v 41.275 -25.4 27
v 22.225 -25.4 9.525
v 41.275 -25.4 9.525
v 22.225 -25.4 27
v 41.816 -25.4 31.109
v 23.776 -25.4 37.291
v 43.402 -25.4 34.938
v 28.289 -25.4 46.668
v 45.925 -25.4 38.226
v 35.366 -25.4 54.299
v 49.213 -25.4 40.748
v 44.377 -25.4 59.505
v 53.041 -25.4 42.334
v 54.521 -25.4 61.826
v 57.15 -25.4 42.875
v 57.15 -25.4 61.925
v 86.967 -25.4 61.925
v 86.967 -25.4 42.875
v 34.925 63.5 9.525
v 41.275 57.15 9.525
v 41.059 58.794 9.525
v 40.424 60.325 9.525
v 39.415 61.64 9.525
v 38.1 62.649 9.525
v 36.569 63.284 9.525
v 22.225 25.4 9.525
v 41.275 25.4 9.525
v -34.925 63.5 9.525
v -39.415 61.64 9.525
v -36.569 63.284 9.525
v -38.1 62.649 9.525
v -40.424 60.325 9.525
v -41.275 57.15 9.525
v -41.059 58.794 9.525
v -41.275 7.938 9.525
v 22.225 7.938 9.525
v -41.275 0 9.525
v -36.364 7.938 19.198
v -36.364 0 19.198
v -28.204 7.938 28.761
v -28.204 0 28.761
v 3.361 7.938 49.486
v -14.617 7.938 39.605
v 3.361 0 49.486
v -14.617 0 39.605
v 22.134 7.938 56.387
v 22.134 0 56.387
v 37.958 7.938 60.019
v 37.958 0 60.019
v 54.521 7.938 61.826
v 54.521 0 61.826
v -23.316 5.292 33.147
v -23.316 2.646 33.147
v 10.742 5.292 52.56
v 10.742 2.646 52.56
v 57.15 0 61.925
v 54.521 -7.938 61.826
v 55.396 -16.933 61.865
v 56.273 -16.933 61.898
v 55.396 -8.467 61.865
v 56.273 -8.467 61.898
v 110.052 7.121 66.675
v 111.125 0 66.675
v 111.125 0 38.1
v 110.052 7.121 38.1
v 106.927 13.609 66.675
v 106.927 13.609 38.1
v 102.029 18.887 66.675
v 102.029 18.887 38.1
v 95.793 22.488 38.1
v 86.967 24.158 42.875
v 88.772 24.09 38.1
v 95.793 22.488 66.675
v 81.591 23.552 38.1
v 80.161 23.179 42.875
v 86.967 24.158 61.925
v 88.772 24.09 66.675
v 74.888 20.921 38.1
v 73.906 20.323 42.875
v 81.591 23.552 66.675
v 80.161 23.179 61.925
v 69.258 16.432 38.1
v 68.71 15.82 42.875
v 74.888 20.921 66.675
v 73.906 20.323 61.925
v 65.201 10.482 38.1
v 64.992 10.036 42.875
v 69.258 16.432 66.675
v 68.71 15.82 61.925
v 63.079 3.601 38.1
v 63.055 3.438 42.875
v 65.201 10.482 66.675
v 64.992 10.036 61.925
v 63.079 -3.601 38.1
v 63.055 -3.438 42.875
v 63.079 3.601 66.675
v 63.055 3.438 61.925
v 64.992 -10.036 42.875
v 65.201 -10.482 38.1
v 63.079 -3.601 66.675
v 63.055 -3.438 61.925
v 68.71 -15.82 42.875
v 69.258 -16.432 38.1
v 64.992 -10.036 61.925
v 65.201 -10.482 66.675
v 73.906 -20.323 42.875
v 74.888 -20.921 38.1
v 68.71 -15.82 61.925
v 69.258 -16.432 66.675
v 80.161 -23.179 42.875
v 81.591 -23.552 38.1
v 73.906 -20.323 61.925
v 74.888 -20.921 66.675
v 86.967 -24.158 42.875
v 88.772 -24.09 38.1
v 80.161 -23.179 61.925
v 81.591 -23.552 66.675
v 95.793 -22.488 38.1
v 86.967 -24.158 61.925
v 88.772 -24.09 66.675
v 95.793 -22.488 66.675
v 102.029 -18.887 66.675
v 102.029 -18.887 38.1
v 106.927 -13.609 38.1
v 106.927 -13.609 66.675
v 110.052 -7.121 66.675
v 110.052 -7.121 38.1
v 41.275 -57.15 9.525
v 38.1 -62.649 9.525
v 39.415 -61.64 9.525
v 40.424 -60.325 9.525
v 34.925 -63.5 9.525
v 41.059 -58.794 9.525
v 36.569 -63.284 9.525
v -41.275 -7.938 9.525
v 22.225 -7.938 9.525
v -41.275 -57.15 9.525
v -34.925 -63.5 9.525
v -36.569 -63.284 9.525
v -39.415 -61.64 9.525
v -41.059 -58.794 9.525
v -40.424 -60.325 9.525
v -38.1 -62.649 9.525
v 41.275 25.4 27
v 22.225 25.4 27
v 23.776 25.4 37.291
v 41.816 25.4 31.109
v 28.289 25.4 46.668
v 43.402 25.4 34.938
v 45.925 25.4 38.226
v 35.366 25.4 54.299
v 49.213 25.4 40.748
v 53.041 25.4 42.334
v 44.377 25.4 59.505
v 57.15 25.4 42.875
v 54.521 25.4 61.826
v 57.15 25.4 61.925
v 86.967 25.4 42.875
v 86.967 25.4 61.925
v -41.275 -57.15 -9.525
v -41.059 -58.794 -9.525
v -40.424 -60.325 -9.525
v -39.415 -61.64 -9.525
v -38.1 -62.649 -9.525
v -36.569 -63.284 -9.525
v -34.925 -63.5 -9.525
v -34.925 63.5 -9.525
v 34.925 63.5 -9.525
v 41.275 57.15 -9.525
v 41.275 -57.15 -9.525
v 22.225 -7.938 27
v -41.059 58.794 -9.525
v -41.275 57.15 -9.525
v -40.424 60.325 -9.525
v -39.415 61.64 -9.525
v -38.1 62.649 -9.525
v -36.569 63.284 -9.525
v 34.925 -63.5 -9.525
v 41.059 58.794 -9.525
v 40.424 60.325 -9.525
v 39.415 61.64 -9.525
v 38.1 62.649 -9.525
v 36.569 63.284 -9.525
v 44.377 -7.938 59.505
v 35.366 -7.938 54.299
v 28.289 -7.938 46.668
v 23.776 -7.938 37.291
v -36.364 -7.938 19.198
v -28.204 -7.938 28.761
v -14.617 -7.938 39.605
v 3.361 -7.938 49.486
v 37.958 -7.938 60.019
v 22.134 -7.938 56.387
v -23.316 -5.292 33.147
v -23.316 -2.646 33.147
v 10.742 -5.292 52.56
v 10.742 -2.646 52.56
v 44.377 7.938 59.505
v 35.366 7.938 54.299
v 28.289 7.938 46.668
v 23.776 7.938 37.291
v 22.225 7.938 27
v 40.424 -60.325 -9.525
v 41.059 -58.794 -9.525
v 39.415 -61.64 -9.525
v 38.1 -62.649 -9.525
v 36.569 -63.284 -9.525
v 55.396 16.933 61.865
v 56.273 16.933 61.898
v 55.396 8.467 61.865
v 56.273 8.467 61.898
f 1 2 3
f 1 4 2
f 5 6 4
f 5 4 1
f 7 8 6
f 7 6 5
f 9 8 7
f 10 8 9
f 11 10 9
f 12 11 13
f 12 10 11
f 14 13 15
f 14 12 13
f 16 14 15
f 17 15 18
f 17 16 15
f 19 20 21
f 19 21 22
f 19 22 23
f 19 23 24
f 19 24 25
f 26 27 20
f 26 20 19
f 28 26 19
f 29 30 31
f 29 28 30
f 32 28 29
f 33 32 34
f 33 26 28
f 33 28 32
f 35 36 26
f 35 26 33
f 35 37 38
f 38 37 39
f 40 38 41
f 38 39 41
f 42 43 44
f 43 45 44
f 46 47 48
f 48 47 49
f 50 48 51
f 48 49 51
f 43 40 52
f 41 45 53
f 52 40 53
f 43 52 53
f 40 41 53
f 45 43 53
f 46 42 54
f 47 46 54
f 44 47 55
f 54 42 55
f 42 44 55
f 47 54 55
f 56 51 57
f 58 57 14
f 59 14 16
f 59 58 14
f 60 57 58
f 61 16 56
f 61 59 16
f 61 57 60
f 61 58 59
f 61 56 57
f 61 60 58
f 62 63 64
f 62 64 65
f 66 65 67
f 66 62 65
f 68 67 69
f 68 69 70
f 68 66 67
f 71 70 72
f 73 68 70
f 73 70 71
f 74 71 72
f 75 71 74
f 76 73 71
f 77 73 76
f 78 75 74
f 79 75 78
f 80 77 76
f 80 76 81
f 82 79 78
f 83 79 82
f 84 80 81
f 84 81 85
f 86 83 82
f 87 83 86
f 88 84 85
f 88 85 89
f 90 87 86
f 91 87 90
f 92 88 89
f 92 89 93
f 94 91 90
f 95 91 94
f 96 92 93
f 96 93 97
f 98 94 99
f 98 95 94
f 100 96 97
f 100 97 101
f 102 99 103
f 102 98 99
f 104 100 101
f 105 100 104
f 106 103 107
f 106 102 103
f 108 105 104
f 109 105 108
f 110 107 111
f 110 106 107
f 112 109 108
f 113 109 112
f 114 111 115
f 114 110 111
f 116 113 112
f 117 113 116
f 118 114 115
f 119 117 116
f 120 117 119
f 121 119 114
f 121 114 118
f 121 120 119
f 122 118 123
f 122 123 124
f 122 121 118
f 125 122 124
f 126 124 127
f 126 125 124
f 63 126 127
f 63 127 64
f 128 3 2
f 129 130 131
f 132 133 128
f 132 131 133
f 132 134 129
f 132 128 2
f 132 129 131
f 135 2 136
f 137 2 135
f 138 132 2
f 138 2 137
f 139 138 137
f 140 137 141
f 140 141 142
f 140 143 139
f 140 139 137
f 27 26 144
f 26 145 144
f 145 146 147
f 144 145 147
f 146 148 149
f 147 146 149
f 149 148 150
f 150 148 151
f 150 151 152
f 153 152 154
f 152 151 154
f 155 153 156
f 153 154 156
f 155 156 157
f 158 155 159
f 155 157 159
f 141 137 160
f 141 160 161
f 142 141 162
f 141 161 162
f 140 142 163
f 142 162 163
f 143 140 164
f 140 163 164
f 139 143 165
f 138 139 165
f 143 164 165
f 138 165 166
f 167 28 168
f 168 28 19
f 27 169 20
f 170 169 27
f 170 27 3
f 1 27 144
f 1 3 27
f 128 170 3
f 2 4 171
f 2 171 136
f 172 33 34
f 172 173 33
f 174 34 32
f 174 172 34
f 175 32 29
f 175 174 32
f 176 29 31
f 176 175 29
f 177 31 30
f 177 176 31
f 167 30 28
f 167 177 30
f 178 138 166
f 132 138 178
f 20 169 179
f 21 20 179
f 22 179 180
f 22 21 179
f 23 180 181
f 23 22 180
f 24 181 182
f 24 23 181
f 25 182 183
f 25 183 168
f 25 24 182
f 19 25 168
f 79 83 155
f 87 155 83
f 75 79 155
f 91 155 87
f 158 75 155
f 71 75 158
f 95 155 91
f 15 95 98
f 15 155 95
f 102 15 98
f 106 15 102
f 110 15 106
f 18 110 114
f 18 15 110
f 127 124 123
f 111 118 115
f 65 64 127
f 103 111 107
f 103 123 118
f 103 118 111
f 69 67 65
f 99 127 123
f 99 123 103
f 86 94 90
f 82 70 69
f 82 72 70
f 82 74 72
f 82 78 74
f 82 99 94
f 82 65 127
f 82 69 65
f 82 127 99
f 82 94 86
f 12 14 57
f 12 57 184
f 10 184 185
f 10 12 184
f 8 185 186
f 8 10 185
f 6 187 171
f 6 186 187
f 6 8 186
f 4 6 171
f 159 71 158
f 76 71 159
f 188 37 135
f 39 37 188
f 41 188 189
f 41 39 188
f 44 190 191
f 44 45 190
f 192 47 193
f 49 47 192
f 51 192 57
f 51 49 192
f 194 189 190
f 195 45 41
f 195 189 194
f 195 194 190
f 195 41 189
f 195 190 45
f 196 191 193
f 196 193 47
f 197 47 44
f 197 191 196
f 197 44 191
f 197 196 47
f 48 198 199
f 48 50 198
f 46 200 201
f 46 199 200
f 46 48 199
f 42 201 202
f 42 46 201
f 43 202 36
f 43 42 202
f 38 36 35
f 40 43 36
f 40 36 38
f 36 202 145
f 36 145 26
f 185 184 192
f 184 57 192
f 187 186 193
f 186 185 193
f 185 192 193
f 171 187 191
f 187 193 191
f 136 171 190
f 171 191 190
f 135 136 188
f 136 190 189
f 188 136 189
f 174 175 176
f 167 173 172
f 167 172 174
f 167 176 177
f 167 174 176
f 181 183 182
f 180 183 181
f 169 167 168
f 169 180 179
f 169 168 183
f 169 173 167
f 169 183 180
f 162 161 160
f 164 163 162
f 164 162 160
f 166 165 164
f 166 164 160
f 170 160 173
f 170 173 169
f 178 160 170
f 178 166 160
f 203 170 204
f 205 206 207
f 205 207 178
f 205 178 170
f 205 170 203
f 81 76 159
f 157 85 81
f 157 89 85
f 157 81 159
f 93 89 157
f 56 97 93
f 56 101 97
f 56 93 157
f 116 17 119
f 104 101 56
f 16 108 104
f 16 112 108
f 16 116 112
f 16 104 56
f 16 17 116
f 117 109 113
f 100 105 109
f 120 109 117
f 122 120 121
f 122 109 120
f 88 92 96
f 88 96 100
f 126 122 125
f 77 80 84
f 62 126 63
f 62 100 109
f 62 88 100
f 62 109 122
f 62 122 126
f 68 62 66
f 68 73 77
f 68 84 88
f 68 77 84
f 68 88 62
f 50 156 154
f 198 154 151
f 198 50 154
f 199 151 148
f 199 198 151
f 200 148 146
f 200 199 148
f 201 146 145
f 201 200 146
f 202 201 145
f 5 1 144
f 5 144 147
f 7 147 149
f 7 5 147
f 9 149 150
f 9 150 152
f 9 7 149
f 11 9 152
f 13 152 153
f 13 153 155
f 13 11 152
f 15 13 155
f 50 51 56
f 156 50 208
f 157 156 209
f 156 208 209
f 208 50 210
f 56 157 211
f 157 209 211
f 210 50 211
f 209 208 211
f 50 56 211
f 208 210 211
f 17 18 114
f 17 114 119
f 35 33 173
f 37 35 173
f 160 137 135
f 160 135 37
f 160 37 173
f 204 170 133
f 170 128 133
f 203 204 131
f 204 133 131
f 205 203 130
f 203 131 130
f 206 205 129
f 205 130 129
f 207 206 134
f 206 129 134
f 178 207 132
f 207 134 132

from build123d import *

# Parameters (mm, degrees)
F1_DEPTH = 63.5
F0_W     = 26.6420548012
F0_H     = 19.05
F2_DEPTH = 25.4
F3_DEPTH = 7.9375
F5_R     = 6.35


# Not quite as in the source:
# - a feature of the source that left no trace in its solid (it failed there, or was rolled back) is left out


with BuildPart() as f1:
    # F0 (on Front) → F1 (new body, symmetric)
    with BuildSketch(Plane.XZ):
        Polygon((-41.275, 9.525), (-41.275, -9.525), (41.275, -9.525), (41.275, 9.525), (22.225, 9.525), align=None)
    extrude(amount=F1_DEPTH, both=True)

    # F0 (on Front) → F2 (join, symmetric)
    with BuildSketch(Plane.XZ):
        with BuildLine():
            Line((22.225, 9.525), (41.275, 9.525))
            Line((41.275, 9.525), (41.275, 27.0002))
            ThreePointArc((41.275, 27.0002), (45.9246798487, 38.2255201513), (57.15, 42.8752))
            Line((57.15, 42.8752), (60.325, 42.8752))
            Line((60.325, 42.8752), (60.325, 61.9252))
            Line((60.325, 61.9252), (57.15, 61.9252))
            add(Edge.make_bspline(
                [(54.5213953348, 61.8261395066), (55.3958874756, 61.867746875), (56.2721525992, 61.9008262266), (57.15, 61.9252)],
                knots=[109.4468822065, 109.4468822065, 109.4468822065, 109.4468822065, 111.5045361635, 111.5045361635, 111.5045361635, 111.5045361635], degree=3))
            ThreePointArc((54.5213953348, 61.8261395066), (31.5418016747, 50.7483747411), (22.225, 27.0002))
            Line((22.225, 27.0002), (22.225, 9.525))
        make_face()
        with Locations((73.6460274006, 52.4002)):
            Rectangle(F0_W, F0_H)
    extrude(amount=F2_DEPTH, both=True)

    # F0 (on Front) → F3 (join, symmetric)
    with BuildSketch(Plane.XZ):
        with BuildLine():
            add(Edge.make_bspline(
                [(-41.275, 9.525), (-33.4912011652, 33.272556952), (8.0070443726, 59.6130381539), (54.5213953348, 61.8261395066)],
                knots=[0, 0, 0, 0, 109.4468822065, 109.4468822065, 109.4468822065, 109.4468822065], degree=3))
            Line((-41.275, 9.525), (22.225, 9.525))
            Line((22.225, 9.525), (22.225, 27.0002))
            ThreePointArc((22.225, 27.0002), (31.5418016747, 50.7483747411), (54.5213953348, 61.8261395066))
        make_face()
    extrude(amount=F3_DEPTH, both=True)

    # F0 (on Front) → F4 (revolve)
    with BuildSketch(Plane.XZ):
        Polygon((86.9670548012, 66.675), (86.9670548012, 61.9252), (86.9670548012, 42.8752), (86.9670548012, 38.1), (111.125, 38.1), (111.125, 66.675), align=None)
    revolve(axis=Axis((86.9670548012, 0, 52.3875), (0, 0, 1)))

    # F5
    f5_edges = [f1.edges().sort_by_distance(p)[0] for p in [
        (-41.275, -63.5, 0),
        (41.275, -63.5, 0),
        (41.275, 63.5, 0),
        (-41.275, 63.5, 0),
    ]]
    fillet(f5_edges, radius=F5_R)


solid = f1.part
